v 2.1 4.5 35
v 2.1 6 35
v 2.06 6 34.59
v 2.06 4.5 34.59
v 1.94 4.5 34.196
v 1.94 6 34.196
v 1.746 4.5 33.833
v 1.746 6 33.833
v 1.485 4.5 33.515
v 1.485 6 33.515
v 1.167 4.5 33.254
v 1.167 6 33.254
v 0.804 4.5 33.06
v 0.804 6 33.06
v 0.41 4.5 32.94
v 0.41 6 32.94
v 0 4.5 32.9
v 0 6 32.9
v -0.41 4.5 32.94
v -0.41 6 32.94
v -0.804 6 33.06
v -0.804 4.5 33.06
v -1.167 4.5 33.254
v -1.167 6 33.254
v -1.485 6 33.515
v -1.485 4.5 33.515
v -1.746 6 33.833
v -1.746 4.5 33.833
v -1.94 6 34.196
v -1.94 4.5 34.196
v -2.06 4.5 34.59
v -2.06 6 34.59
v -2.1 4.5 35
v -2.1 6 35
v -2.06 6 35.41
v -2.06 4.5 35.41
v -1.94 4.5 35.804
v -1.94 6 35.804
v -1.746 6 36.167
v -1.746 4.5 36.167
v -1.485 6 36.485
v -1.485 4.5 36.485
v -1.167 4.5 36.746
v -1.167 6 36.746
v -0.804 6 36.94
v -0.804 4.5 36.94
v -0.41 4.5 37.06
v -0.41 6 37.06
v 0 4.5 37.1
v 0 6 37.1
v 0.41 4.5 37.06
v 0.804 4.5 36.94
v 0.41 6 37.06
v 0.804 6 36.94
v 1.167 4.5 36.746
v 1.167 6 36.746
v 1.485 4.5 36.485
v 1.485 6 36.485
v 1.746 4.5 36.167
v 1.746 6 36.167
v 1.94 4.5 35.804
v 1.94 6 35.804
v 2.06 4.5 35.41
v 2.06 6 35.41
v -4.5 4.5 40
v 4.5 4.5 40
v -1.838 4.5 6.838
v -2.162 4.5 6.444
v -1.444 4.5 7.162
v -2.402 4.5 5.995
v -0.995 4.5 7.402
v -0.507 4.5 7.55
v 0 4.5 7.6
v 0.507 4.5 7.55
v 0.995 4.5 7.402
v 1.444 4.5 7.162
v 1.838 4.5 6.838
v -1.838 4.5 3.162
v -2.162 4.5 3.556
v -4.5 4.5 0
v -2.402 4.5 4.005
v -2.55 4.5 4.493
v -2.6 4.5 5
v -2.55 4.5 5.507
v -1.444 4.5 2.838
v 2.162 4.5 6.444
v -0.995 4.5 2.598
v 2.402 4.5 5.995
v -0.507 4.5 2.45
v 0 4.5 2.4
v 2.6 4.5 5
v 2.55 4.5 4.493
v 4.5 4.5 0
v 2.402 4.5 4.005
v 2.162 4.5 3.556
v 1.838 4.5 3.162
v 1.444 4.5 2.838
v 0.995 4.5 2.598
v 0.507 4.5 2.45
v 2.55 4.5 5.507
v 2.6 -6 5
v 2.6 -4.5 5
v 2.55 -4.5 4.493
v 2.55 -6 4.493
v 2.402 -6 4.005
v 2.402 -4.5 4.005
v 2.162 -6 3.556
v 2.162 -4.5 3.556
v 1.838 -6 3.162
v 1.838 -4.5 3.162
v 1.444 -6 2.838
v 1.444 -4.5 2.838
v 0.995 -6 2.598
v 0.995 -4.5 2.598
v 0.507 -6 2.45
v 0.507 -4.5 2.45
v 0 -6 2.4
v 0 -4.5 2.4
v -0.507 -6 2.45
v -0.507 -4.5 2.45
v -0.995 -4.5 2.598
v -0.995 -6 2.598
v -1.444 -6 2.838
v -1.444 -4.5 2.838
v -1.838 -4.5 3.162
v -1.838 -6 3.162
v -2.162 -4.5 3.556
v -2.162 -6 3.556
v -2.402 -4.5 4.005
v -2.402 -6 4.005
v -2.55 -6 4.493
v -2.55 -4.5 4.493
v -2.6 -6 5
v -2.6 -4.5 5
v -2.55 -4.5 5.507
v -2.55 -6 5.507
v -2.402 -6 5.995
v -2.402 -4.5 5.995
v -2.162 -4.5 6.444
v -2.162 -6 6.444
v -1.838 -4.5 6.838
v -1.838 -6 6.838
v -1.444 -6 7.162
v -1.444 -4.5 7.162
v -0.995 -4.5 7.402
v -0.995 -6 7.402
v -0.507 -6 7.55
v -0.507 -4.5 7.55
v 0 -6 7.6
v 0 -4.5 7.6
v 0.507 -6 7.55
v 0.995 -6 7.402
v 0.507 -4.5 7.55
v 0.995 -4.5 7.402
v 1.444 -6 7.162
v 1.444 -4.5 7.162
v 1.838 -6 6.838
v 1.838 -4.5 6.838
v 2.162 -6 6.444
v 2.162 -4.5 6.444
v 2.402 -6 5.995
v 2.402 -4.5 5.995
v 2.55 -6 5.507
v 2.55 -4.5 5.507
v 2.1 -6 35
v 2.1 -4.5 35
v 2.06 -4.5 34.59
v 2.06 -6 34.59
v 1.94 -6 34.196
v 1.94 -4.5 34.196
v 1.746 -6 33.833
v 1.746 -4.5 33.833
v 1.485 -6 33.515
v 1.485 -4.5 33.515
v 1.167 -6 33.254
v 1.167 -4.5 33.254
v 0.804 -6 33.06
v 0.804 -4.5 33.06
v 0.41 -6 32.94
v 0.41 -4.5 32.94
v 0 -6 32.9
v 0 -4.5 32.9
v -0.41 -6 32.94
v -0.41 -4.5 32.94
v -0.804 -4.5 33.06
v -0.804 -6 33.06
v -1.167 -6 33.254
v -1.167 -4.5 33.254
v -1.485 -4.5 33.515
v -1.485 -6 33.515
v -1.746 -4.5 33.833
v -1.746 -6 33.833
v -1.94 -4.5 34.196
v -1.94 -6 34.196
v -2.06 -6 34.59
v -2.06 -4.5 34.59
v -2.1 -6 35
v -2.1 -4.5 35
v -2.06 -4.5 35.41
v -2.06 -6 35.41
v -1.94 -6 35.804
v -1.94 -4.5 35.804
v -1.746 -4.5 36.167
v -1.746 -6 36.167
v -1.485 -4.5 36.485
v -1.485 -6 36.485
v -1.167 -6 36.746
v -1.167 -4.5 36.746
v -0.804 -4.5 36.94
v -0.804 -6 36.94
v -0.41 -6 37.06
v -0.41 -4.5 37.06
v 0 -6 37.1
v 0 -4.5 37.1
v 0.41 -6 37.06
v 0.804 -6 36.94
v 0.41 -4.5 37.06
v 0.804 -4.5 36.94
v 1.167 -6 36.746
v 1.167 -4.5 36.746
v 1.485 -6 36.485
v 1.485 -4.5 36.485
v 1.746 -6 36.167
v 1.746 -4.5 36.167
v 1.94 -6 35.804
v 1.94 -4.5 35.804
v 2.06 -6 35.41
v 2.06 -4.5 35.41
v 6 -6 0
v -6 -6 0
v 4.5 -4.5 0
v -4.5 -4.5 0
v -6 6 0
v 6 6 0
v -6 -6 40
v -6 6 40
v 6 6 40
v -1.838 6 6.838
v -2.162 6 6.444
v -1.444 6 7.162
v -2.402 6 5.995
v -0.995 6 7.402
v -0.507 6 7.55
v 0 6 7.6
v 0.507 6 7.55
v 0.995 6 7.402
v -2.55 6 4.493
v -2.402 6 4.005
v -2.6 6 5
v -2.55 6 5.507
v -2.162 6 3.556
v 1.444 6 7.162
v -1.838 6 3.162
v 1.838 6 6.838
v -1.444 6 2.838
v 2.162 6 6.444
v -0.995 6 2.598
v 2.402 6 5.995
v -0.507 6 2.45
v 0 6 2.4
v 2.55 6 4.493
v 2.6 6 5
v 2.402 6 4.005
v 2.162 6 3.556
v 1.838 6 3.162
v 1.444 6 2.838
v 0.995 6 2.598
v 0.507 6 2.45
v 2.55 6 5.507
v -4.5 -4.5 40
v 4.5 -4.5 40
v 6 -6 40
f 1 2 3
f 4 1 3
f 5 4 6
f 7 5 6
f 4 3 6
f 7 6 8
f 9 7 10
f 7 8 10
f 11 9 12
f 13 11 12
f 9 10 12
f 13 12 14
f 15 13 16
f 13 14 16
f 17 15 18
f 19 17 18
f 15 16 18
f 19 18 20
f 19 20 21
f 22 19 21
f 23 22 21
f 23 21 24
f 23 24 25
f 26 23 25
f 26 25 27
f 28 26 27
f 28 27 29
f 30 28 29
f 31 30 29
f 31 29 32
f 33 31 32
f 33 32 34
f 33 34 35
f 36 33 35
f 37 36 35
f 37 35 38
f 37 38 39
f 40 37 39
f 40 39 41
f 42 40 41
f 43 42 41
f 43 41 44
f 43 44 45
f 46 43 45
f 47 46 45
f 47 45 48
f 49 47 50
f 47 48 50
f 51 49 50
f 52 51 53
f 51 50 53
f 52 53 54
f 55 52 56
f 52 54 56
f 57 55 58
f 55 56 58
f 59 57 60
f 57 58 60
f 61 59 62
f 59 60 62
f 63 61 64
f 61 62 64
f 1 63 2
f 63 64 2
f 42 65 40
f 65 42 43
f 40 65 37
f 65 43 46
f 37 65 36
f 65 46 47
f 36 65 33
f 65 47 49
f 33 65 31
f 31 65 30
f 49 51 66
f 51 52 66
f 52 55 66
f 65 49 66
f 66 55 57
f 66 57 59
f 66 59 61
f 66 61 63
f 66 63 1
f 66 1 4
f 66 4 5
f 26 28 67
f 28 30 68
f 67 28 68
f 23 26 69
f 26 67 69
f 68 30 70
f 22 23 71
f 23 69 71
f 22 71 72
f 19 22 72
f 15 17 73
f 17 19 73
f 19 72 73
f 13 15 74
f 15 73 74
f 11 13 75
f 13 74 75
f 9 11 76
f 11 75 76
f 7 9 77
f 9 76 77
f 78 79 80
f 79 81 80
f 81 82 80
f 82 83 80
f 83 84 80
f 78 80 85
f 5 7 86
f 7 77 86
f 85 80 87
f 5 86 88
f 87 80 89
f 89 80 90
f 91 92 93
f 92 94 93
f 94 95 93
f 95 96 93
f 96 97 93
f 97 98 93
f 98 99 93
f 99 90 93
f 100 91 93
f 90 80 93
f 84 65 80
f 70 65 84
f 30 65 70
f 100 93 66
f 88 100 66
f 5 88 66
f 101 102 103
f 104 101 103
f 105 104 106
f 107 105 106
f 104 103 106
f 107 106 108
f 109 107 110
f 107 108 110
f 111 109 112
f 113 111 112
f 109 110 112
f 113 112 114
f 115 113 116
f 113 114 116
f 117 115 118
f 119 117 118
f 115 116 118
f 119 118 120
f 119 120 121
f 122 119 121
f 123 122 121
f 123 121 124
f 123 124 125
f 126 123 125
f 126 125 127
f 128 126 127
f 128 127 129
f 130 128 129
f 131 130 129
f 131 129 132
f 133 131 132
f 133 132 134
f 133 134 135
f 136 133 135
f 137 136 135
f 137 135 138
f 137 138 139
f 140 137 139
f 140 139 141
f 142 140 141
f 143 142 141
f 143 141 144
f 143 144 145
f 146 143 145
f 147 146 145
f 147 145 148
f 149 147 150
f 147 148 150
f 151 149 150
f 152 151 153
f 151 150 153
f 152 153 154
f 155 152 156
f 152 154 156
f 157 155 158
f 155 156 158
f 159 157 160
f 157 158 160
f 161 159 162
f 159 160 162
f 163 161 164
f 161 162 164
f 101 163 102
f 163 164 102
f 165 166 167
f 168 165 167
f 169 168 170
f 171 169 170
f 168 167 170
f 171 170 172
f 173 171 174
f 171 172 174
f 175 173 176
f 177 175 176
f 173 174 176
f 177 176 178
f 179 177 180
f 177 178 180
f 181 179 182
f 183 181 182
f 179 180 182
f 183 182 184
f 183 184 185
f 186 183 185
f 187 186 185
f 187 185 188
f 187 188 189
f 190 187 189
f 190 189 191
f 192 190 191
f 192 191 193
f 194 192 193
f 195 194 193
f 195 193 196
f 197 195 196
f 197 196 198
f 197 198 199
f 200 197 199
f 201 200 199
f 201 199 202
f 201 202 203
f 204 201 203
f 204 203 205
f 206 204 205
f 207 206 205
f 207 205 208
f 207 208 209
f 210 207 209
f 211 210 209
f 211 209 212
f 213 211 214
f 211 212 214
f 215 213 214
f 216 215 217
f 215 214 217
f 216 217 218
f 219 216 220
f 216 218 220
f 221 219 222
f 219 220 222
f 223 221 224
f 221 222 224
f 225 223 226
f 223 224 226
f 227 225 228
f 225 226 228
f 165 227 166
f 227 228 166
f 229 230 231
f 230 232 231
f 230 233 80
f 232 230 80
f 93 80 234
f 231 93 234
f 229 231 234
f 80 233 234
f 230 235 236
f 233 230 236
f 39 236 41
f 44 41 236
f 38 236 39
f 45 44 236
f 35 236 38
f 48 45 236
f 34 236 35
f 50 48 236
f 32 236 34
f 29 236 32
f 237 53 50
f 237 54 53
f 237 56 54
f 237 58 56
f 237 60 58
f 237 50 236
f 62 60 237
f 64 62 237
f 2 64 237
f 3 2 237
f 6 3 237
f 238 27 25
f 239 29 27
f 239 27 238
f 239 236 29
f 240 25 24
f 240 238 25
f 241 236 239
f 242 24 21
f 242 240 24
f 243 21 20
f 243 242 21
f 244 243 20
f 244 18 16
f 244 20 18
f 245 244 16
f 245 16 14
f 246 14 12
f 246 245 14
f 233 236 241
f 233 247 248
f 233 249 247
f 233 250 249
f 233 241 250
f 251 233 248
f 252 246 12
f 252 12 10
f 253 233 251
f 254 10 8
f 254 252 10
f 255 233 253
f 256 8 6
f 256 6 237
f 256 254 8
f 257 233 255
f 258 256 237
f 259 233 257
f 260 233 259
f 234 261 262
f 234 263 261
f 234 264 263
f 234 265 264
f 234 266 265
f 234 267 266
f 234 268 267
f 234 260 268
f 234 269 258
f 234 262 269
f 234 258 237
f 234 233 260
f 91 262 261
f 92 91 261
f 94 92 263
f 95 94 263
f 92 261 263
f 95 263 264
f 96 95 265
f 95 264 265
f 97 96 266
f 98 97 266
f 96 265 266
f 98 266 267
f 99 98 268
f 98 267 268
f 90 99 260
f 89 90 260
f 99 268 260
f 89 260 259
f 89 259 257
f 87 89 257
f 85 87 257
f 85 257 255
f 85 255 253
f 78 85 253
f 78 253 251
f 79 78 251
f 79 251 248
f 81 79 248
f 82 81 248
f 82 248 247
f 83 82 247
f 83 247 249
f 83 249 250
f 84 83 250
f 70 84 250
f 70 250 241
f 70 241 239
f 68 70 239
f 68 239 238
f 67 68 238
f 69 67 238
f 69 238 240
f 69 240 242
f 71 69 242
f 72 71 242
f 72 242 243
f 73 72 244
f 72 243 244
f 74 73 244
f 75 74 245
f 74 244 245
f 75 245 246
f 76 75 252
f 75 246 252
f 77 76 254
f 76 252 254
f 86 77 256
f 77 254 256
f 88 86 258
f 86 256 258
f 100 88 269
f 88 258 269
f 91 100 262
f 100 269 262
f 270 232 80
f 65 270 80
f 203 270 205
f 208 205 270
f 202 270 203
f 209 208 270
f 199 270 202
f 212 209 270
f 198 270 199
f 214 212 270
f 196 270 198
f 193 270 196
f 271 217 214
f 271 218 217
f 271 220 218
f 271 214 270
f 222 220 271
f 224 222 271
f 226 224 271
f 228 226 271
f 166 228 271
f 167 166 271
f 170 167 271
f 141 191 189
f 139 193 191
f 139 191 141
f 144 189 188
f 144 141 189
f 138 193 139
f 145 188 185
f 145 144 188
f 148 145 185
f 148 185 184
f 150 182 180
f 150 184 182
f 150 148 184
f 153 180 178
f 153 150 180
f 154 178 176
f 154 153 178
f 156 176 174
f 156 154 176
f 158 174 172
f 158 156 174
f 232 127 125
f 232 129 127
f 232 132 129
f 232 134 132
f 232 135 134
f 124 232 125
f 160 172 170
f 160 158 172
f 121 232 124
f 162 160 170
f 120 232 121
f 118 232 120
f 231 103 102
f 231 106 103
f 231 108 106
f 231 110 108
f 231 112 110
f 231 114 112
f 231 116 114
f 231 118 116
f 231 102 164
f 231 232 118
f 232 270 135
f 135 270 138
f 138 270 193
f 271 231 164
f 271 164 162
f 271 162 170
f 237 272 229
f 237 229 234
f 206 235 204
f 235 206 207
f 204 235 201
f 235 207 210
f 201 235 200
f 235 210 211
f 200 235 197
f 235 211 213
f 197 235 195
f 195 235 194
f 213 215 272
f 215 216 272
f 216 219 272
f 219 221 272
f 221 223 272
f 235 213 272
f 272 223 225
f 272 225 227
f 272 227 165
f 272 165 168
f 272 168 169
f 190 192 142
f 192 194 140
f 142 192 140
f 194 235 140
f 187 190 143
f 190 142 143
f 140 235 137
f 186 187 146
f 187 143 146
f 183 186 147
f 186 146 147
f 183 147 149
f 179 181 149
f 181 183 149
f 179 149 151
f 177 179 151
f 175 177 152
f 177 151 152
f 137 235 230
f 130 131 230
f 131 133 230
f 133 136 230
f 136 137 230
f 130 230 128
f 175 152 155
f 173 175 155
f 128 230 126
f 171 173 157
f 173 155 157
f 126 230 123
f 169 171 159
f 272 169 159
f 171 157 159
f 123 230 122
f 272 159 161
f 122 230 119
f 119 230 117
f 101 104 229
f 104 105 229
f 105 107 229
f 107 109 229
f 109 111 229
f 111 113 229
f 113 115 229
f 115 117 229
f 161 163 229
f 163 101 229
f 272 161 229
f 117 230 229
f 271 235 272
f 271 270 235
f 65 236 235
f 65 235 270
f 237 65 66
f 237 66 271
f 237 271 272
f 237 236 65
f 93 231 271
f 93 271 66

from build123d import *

# Parameters (mm, degrees)
SKETCH_1_W          = 12
SKETCH_1_H          = 12
SKETCH_1_W_2        = 9
SKETCH_1_H_2        = 9
EXTRUDE_1_DEPTH     = 40
SKETCH_2_R          = 2.6
SKETCH_2_R_2        = 2.1
CUT_EXTRUDE_1_DEPTH = 30


with BuildPart() as part:
    # ｽｹｯﾁ1 → ﾎﾞｽ - 押し出し1 (new body)
    with BuildSketch(Plane.XY):
        Rectangle(SKETCH_1_W, SKETCH_1_H)
        Rectangle(SKETCH_1_W_2, SKETCH_1_H_2, mode=Mode.SUBTRACT)
    extrude(amount=EXTRUDE_1_DEPTH)

    # ｽｹｯﾁ2 → ｶｯﾄ - 押し出し1 (cut)
    with BuildSketch(Plane(origin=(0, 6, 0), x_dir=(1, 0, 0), z_dir=(0, 1, 0))):
        with Locations((0, -5)):
            Circle(SKETCH_2_R)
        with Locations((0, -35)):
            Circle(SKETCH_2_R_2)
    extrude(amount=-CUT_EXTRUDE_1_DEPTH, mode=Mode.SUBTRACT)


solid = part.part
